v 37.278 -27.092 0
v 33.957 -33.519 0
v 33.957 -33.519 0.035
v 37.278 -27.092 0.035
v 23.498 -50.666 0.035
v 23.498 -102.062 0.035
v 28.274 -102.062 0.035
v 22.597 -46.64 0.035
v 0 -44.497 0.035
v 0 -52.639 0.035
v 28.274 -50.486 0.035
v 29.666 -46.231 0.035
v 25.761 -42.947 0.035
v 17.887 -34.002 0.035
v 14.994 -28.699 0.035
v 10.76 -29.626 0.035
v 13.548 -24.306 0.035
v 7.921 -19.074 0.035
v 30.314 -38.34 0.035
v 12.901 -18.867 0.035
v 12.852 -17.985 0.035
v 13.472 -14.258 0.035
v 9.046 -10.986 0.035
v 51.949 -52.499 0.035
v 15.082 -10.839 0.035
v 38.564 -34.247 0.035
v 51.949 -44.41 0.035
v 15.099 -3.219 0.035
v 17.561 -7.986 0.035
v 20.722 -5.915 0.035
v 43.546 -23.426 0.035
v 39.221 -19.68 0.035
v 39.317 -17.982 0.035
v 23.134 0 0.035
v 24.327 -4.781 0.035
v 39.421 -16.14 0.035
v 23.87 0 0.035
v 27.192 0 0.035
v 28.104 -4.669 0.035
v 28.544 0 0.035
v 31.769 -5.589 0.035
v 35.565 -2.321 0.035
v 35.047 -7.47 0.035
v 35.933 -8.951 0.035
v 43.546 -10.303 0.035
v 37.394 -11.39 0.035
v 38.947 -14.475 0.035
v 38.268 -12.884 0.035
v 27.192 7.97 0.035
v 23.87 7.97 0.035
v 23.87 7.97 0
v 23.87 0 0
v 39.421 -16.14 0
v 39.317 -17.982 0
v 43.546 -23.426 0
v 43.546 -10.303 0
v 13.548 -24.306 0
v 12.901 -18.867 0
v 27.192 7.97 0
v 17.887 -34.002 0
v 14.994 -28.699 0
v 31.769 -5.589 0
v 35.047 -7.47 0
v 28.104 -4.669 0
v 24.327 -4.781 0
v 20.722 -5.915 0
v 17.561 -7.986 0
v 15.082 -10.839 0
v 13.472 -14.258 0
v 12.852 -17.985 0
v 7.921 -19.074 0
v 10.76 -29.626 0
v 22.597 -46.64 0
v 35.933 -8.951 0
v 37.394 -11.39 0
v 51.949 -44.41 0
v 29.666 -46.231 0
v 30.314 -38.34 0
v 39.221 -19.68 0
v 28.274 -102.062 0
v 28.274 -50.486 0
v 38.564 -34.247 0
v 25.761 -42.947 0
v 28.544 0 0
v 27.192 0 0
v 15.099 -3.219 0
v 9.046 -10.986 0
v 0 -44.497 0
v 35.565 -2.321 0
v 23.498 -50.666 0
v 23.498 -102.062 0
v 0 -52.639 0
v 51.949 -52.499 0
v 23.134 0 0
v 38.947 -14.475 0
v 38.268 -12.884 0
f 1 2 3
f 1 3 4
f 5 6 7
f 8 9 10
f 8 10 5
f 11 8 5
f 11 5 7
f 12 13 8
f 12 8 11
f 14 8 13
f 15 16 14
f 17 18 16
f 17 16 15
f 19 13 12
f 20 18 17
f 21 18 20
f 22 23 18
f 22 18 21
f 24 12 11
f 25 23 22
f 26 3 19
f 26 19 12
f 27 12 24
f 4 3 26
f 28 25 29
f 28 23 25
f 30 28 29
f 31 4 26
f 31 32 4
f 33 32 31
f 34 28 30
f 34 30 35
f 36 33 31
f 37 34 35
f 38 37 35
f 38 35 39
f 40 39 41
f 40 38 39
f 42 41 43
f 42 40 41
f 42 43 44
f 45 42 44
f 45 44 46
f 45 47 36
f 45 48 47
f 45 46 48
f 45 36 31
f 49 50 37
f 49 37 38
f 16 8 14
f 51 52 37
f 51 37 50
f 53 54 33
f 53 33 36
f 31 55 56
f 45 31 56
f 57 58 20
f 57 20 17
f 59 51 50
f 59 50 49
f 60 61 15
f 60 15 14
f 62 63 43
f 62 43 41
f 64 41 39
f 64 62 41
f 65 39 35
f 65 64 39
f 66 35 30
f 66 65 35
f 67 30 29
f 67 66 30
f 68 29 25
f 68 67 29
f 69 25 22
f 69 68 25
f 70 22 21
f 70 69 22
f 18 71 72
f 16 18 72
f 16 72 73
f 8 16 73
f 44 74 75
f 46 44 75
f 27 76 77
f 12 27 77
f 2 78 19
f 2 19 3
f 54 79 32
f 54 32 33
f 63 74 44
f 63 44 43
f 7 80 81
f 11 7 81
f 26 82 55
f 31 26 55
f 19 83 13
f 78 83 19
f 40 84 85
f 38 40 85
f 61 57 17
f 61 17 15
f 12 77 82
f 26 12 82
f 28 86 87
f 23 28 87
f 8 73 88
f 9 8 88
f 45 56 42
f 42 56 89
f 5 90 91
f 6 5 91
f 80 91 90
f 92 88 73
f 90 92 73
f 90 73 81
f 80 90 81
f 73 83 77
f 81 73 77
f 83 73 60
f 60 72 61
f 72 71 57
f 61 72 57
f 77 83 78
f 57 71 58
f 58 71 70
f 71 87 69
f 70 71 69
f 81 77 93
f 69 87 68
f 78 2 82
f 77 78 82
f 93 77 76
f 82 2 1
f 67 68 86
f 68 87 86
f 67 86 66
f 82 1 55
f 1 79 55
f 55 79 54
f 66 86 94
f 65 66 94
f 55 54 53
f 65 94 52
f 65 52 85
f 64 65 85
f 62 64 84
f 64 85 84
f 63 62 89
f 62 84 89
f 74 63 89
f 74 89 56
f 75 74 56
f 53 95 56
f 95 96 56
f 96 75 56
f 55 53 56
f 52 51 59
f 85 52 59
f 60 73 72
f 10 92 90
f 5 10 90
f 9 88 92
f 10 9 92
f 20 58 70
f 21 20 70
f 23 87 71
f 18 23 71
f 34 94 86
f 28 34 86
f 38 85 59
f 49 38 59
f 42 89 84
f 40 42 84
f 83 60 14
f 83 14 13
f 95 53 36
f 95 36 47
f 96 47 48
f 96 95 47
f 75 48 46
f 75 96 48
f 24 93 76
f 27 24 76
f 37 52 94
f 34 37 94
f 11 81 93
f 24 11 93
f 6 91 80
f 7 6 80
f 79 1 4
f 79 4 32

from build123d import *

# Parameters (mm, degrees)
SKETCH_W         = 3.322
SKETCH_H         = 8.904724
EXTRUDE003_DEPTH = 0.035
EXTRUDE_DEPTH    = 0.035


with BuildPart() as inport:
    # Sketch (on Face6 of Extrude001) → Extrude003 (new body)
    with BuildSketch(Plane.XY):
        with Locations((25.530795, 3.517178)):
            Rectangle(SKETCH_W, SKETCH_H)
    extrude(amount=EXTRUDE003_DEPTH)


with BuildPart() as copper_layer:
    # Sketch006 → Extrude (new body)
    with BuildSketch(Plane.XY):
        Polygon((23.498381, -102.062126), (28.273891, -102.062126), (28.273891, -50.486412), (51.949276, -52.498531), (51.949276, -44.41013), (29.665995, -46.231361), (38.564362, -34.246563), (43.545963, -23.426317), (43.545963, -10.302752), (35.56469, -2.321481), (28.543734, 0), (23.13361, 0), (15.098775, -3.218604), (9.045863, -10.985613), (7.920988, -19.074015), (10.759965, -29.626432), (22.596775, -46.640076), (0, -44.497452), (0, -52.63942), (23.498381, -50.665943), align=None)
        with BuildLine():
            Line((12.900836, -18.866589), (13.548023, -24.306177))
            Line((13.548023, -24.306177), (14.994295, -28.698555))
            Line((14.994295, -28.698555), (17.886837, -34.001549))
            Line((17.886837, -34.001549), (25.760977, -42.946999))
            Line((25.760977, -42.946999), (30.314053, -38.340359))
            Line((30.314053, -38.340359), (33.956512, -33.519459))
            Line((33.956512, -33.519459), (37.277576, -27.091587))
            Line((37.277576, -27.091587), (39.221496, -19.680452))
            Line((39.221496, -19.680452), (39.317309, -17.981558))
            Line((39.317309, -17.981558), (39.421192, -16.139563))
            ThreePointArc((39.421192, -16.139563), (38.632704, -13.668833), (37.394095, -11.390222))
            Line((35.933163, -8.951125), (37.394095, -11.390222))
            Line((35.933163, -8.951125), (35.047039, -7.469805))
            ThreePointArc((35.047039, -7.469805), (20.72172, -5.915046), (12.85167, -17.985437))
            Line((12.900836, -18.866589), (12.85167, -17.985437))
        make_face(mode=Mode.SUBTRACT)
    extrude(amount=EXTRUDE_DEPTH)

    # Fusion: union inPort
    add(inport.part)


solid = copper_layer.part
